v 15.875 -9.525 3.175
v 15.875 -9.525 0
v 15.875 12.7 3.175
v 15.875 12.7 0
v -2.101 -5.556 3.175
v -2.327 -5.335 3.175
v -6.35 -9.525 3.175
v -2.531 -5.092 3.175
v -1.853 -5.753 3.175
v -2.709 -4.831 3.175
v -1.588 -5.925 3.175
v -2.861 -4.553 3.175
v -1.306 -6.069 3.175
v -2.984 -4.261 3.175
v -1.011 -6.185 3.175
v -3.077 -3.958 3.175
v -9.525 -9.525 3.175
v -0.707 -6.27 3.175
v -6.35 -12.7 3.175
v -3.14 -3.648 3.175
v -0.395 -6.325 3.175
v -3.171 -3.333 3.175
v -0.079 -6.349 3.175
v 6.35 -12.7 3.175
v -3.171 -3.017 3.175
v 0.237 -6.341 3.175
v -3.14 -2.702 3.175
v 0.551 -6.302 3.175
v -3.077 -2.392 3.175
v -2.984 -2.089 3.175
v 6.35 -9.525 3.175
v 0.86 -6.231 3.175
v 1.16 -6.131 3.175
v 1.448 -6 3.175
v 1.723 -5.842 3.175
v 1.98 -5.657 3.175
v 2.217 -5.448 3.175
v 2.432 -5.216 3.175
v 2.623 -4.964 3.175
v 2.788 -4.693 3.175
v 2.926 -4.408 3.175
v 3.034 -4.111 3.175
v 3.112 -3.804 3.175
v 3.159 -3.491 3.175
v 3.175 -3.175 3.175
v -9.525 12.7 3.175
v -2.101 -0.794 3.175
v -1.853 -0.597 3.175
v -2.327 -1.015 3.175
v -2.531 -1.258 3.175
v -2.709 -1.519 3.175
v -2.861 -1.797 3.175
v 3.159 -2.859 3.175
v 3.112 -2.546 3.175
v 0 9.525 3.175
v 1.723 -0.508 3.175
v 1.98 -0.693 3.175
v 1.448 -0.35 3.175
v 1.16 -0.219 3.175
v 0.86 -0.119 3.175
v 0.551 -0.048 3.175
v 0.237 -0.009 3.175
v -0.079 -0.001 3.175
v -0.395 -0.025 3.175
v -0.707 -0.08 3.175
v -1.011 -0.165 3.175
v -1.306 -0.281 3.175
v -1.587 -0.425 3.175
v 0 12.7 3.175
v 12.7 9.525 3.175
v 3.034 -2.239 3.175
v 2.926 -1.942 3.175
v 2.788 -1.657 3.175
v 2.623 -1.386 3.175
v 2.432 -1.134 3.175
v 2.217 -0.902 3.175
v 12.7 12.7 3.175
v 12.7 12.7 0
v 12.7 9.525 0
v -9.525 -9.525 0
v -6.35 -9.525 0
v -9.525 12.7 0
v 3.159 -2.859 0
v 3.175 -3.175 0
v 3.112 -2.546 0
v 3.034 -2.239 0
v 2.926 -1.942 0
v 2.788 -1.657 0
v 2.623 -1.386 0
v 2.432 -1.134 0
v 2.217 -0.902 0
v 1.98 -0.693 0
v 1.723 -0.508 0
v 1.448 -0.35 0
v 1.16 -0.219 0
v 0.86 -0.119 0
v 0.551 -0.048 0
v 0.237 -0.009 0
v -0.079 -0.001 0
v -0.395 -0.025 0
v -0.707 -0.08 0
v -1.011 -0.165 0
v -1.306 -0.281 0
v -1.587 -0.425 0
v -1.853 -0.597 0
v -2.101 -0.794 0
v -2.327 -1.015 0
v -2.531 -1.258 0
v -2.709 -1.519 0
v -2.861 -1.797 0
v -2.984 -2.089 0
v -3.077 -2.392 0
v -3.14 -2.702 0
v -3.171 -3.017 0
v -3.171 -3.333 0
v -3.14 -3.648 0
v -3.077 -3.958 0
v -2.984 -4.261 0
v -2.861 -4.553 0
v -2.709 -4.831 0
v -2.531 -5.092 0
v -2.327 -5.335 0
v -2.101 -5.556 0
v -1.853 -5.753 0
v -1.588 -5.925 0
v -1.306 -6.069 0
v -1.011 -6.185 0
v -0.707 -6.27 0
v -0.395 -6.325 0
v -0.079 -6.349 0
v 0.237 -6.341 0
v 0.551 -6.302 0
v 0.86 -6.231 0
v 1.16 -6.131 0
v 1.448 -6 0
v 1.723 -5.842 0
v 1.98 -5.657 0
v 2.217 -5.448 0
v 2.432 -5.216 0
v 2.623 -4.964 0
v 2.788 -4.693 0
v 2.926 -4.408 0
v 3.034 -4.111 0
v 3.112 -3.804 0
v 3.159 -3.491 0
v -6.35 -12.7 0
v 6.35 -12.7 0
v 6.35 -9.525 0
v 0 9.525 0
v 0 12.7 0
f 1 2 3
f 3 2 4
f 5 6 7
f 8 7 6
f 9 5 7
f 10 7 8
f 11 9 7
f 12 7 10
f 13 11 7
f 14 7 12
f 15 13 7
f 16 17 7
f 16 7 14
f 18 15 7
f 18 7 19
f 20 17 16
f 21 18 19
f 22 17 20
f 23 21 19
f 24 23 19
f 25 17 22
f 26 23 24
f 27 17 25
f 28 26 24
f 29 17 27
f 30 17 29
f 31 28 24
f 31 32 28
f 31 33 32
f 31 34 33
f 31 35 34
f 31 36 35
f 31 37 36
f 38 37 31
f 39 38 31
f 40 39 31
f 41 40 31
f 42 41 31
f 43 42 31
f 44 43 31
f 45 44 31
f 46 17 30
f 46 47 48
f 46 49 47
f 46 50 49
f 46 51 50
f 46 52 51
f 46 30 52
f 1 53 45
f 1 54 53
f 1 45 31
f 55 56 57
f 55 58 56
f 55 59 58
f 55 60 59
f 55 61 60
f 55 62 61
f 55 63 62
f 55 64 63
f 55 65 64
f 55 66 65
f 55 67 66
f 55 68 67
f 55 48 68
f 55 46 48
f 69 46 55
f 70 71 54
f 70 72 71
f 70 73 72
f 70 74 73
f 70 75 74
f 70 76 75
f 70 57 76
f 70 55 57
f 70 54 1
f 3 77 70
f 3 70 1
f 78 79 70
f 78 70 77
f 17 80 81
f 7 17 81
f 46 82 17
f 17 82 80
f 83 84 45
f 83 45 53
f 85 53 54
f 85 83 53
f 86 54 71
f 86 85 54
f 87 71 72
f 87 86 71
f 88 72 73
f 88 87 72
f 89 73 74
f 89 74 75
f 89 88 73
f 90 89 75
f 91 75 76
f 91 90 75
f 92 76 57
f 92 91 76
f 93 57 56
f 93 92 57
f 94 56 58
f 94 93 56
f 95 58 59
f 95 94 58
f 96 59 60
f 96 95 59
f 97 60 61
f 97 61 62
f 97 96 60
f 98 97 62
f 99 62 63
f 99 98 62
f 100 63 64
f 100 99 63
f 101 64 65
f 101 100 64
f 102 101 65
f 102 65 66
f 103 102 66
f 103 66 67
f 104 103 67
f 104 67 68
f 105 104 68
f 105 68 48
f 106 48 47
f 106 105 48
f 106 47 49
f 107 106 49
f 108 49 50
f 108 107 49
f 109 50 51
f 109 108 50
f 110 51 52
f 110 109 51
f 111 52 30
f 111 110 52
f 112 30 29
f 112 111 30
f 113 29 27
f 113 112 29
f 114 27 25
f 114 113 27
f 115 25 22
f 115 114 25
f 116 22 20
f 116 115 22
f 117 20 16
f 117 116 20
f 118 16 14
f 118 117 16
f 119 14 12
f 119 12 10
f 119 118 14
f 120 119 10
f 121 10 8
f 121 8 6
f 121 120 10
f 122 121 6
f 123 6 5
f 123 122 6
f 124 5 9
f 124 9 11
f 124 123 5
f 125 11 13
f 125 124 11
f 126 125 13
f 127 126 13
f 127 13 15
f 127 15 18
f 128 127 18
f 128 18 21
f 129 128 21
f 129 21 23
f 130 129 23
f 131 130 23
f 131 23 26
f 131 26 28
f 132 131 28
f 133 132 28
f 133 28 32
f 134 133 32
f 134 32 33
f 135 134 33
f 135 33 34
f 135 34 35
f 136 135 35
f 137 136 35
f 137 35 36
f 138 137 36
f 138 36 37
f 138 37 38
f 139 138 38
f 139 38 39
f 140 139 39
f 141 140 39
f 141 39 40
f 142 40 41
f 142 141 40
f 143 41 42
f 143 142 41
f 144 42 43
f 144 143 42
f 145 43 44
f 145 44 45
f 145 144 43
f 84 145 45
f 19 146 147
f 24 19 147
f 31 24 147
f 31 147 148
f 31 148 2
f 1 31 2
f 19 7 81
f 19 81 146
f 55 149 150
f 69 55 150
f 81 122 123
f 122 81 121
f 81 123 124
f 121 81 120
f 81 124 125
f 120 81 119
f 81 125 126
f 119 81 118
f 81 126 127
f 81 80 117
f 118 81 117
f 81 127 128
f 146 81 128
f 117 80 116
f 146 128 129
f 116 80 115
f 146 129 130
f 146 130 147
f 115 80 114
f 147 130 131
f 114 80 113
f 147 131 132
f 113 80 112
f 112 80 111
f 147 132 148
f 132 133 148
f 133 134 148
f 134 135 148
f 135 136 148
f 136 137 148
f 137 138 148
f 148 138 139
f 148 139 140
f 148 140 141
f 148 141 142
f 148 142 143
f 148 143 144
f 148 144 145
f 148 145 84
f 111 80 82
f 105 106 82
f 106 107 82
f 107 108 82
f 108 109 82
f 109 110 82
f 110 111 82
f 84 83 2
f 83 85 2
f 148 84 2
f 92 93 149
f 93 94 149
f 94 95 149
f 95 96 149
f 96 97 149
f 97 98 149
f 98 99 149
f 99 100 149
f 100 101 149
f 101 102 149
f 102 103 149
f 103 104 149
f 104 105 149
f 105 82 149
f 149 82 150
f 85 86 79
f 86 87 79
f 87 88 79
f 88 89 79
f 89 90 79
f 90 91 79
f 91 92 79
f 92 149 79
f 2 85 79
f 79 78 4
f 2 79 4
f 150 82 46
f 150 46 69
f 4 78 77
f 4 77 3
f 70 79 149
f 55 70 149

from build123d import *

# Parameters (mm, degrees)
F0_W     = 3.175
F0_H     = 3.175
F0_W_2   = 9.525
F0_R     = 3.175
F1_DEPTH = 3.175


with BuildPart() as f1:
    # F0 (on Top) → F1 (new body)
    with BuildSketch(Plane.XY):
        Polygon((9.525, 9.525), (9.525, -9.525), (15.875, -9.525), (15.875, 9.525), (12.7, 9.525), align=None)
        with Locations((14.2875, 11.1125)):
            Rectangle(F0_W, F0_H)
        with Locations((-4.7625, 11.1125)):
            Rectangle(F0_W_2, F0_H)
        Polygon((6.35, -9.525), (9.525, -9.525), (9.525, 9.525), (0, 9.525), (-9.525, 9.525), (-9.525, -9.525), (-6.35, -9.525), (-6.35, -12.7), (6.35, -12.7), align=None)
        with Locations((0, -3.175)):
            Circle(F0_R, mode=Mode.SUBTRACT)
    extrude(amount=F1_DEPTH)


solid = f1.part
